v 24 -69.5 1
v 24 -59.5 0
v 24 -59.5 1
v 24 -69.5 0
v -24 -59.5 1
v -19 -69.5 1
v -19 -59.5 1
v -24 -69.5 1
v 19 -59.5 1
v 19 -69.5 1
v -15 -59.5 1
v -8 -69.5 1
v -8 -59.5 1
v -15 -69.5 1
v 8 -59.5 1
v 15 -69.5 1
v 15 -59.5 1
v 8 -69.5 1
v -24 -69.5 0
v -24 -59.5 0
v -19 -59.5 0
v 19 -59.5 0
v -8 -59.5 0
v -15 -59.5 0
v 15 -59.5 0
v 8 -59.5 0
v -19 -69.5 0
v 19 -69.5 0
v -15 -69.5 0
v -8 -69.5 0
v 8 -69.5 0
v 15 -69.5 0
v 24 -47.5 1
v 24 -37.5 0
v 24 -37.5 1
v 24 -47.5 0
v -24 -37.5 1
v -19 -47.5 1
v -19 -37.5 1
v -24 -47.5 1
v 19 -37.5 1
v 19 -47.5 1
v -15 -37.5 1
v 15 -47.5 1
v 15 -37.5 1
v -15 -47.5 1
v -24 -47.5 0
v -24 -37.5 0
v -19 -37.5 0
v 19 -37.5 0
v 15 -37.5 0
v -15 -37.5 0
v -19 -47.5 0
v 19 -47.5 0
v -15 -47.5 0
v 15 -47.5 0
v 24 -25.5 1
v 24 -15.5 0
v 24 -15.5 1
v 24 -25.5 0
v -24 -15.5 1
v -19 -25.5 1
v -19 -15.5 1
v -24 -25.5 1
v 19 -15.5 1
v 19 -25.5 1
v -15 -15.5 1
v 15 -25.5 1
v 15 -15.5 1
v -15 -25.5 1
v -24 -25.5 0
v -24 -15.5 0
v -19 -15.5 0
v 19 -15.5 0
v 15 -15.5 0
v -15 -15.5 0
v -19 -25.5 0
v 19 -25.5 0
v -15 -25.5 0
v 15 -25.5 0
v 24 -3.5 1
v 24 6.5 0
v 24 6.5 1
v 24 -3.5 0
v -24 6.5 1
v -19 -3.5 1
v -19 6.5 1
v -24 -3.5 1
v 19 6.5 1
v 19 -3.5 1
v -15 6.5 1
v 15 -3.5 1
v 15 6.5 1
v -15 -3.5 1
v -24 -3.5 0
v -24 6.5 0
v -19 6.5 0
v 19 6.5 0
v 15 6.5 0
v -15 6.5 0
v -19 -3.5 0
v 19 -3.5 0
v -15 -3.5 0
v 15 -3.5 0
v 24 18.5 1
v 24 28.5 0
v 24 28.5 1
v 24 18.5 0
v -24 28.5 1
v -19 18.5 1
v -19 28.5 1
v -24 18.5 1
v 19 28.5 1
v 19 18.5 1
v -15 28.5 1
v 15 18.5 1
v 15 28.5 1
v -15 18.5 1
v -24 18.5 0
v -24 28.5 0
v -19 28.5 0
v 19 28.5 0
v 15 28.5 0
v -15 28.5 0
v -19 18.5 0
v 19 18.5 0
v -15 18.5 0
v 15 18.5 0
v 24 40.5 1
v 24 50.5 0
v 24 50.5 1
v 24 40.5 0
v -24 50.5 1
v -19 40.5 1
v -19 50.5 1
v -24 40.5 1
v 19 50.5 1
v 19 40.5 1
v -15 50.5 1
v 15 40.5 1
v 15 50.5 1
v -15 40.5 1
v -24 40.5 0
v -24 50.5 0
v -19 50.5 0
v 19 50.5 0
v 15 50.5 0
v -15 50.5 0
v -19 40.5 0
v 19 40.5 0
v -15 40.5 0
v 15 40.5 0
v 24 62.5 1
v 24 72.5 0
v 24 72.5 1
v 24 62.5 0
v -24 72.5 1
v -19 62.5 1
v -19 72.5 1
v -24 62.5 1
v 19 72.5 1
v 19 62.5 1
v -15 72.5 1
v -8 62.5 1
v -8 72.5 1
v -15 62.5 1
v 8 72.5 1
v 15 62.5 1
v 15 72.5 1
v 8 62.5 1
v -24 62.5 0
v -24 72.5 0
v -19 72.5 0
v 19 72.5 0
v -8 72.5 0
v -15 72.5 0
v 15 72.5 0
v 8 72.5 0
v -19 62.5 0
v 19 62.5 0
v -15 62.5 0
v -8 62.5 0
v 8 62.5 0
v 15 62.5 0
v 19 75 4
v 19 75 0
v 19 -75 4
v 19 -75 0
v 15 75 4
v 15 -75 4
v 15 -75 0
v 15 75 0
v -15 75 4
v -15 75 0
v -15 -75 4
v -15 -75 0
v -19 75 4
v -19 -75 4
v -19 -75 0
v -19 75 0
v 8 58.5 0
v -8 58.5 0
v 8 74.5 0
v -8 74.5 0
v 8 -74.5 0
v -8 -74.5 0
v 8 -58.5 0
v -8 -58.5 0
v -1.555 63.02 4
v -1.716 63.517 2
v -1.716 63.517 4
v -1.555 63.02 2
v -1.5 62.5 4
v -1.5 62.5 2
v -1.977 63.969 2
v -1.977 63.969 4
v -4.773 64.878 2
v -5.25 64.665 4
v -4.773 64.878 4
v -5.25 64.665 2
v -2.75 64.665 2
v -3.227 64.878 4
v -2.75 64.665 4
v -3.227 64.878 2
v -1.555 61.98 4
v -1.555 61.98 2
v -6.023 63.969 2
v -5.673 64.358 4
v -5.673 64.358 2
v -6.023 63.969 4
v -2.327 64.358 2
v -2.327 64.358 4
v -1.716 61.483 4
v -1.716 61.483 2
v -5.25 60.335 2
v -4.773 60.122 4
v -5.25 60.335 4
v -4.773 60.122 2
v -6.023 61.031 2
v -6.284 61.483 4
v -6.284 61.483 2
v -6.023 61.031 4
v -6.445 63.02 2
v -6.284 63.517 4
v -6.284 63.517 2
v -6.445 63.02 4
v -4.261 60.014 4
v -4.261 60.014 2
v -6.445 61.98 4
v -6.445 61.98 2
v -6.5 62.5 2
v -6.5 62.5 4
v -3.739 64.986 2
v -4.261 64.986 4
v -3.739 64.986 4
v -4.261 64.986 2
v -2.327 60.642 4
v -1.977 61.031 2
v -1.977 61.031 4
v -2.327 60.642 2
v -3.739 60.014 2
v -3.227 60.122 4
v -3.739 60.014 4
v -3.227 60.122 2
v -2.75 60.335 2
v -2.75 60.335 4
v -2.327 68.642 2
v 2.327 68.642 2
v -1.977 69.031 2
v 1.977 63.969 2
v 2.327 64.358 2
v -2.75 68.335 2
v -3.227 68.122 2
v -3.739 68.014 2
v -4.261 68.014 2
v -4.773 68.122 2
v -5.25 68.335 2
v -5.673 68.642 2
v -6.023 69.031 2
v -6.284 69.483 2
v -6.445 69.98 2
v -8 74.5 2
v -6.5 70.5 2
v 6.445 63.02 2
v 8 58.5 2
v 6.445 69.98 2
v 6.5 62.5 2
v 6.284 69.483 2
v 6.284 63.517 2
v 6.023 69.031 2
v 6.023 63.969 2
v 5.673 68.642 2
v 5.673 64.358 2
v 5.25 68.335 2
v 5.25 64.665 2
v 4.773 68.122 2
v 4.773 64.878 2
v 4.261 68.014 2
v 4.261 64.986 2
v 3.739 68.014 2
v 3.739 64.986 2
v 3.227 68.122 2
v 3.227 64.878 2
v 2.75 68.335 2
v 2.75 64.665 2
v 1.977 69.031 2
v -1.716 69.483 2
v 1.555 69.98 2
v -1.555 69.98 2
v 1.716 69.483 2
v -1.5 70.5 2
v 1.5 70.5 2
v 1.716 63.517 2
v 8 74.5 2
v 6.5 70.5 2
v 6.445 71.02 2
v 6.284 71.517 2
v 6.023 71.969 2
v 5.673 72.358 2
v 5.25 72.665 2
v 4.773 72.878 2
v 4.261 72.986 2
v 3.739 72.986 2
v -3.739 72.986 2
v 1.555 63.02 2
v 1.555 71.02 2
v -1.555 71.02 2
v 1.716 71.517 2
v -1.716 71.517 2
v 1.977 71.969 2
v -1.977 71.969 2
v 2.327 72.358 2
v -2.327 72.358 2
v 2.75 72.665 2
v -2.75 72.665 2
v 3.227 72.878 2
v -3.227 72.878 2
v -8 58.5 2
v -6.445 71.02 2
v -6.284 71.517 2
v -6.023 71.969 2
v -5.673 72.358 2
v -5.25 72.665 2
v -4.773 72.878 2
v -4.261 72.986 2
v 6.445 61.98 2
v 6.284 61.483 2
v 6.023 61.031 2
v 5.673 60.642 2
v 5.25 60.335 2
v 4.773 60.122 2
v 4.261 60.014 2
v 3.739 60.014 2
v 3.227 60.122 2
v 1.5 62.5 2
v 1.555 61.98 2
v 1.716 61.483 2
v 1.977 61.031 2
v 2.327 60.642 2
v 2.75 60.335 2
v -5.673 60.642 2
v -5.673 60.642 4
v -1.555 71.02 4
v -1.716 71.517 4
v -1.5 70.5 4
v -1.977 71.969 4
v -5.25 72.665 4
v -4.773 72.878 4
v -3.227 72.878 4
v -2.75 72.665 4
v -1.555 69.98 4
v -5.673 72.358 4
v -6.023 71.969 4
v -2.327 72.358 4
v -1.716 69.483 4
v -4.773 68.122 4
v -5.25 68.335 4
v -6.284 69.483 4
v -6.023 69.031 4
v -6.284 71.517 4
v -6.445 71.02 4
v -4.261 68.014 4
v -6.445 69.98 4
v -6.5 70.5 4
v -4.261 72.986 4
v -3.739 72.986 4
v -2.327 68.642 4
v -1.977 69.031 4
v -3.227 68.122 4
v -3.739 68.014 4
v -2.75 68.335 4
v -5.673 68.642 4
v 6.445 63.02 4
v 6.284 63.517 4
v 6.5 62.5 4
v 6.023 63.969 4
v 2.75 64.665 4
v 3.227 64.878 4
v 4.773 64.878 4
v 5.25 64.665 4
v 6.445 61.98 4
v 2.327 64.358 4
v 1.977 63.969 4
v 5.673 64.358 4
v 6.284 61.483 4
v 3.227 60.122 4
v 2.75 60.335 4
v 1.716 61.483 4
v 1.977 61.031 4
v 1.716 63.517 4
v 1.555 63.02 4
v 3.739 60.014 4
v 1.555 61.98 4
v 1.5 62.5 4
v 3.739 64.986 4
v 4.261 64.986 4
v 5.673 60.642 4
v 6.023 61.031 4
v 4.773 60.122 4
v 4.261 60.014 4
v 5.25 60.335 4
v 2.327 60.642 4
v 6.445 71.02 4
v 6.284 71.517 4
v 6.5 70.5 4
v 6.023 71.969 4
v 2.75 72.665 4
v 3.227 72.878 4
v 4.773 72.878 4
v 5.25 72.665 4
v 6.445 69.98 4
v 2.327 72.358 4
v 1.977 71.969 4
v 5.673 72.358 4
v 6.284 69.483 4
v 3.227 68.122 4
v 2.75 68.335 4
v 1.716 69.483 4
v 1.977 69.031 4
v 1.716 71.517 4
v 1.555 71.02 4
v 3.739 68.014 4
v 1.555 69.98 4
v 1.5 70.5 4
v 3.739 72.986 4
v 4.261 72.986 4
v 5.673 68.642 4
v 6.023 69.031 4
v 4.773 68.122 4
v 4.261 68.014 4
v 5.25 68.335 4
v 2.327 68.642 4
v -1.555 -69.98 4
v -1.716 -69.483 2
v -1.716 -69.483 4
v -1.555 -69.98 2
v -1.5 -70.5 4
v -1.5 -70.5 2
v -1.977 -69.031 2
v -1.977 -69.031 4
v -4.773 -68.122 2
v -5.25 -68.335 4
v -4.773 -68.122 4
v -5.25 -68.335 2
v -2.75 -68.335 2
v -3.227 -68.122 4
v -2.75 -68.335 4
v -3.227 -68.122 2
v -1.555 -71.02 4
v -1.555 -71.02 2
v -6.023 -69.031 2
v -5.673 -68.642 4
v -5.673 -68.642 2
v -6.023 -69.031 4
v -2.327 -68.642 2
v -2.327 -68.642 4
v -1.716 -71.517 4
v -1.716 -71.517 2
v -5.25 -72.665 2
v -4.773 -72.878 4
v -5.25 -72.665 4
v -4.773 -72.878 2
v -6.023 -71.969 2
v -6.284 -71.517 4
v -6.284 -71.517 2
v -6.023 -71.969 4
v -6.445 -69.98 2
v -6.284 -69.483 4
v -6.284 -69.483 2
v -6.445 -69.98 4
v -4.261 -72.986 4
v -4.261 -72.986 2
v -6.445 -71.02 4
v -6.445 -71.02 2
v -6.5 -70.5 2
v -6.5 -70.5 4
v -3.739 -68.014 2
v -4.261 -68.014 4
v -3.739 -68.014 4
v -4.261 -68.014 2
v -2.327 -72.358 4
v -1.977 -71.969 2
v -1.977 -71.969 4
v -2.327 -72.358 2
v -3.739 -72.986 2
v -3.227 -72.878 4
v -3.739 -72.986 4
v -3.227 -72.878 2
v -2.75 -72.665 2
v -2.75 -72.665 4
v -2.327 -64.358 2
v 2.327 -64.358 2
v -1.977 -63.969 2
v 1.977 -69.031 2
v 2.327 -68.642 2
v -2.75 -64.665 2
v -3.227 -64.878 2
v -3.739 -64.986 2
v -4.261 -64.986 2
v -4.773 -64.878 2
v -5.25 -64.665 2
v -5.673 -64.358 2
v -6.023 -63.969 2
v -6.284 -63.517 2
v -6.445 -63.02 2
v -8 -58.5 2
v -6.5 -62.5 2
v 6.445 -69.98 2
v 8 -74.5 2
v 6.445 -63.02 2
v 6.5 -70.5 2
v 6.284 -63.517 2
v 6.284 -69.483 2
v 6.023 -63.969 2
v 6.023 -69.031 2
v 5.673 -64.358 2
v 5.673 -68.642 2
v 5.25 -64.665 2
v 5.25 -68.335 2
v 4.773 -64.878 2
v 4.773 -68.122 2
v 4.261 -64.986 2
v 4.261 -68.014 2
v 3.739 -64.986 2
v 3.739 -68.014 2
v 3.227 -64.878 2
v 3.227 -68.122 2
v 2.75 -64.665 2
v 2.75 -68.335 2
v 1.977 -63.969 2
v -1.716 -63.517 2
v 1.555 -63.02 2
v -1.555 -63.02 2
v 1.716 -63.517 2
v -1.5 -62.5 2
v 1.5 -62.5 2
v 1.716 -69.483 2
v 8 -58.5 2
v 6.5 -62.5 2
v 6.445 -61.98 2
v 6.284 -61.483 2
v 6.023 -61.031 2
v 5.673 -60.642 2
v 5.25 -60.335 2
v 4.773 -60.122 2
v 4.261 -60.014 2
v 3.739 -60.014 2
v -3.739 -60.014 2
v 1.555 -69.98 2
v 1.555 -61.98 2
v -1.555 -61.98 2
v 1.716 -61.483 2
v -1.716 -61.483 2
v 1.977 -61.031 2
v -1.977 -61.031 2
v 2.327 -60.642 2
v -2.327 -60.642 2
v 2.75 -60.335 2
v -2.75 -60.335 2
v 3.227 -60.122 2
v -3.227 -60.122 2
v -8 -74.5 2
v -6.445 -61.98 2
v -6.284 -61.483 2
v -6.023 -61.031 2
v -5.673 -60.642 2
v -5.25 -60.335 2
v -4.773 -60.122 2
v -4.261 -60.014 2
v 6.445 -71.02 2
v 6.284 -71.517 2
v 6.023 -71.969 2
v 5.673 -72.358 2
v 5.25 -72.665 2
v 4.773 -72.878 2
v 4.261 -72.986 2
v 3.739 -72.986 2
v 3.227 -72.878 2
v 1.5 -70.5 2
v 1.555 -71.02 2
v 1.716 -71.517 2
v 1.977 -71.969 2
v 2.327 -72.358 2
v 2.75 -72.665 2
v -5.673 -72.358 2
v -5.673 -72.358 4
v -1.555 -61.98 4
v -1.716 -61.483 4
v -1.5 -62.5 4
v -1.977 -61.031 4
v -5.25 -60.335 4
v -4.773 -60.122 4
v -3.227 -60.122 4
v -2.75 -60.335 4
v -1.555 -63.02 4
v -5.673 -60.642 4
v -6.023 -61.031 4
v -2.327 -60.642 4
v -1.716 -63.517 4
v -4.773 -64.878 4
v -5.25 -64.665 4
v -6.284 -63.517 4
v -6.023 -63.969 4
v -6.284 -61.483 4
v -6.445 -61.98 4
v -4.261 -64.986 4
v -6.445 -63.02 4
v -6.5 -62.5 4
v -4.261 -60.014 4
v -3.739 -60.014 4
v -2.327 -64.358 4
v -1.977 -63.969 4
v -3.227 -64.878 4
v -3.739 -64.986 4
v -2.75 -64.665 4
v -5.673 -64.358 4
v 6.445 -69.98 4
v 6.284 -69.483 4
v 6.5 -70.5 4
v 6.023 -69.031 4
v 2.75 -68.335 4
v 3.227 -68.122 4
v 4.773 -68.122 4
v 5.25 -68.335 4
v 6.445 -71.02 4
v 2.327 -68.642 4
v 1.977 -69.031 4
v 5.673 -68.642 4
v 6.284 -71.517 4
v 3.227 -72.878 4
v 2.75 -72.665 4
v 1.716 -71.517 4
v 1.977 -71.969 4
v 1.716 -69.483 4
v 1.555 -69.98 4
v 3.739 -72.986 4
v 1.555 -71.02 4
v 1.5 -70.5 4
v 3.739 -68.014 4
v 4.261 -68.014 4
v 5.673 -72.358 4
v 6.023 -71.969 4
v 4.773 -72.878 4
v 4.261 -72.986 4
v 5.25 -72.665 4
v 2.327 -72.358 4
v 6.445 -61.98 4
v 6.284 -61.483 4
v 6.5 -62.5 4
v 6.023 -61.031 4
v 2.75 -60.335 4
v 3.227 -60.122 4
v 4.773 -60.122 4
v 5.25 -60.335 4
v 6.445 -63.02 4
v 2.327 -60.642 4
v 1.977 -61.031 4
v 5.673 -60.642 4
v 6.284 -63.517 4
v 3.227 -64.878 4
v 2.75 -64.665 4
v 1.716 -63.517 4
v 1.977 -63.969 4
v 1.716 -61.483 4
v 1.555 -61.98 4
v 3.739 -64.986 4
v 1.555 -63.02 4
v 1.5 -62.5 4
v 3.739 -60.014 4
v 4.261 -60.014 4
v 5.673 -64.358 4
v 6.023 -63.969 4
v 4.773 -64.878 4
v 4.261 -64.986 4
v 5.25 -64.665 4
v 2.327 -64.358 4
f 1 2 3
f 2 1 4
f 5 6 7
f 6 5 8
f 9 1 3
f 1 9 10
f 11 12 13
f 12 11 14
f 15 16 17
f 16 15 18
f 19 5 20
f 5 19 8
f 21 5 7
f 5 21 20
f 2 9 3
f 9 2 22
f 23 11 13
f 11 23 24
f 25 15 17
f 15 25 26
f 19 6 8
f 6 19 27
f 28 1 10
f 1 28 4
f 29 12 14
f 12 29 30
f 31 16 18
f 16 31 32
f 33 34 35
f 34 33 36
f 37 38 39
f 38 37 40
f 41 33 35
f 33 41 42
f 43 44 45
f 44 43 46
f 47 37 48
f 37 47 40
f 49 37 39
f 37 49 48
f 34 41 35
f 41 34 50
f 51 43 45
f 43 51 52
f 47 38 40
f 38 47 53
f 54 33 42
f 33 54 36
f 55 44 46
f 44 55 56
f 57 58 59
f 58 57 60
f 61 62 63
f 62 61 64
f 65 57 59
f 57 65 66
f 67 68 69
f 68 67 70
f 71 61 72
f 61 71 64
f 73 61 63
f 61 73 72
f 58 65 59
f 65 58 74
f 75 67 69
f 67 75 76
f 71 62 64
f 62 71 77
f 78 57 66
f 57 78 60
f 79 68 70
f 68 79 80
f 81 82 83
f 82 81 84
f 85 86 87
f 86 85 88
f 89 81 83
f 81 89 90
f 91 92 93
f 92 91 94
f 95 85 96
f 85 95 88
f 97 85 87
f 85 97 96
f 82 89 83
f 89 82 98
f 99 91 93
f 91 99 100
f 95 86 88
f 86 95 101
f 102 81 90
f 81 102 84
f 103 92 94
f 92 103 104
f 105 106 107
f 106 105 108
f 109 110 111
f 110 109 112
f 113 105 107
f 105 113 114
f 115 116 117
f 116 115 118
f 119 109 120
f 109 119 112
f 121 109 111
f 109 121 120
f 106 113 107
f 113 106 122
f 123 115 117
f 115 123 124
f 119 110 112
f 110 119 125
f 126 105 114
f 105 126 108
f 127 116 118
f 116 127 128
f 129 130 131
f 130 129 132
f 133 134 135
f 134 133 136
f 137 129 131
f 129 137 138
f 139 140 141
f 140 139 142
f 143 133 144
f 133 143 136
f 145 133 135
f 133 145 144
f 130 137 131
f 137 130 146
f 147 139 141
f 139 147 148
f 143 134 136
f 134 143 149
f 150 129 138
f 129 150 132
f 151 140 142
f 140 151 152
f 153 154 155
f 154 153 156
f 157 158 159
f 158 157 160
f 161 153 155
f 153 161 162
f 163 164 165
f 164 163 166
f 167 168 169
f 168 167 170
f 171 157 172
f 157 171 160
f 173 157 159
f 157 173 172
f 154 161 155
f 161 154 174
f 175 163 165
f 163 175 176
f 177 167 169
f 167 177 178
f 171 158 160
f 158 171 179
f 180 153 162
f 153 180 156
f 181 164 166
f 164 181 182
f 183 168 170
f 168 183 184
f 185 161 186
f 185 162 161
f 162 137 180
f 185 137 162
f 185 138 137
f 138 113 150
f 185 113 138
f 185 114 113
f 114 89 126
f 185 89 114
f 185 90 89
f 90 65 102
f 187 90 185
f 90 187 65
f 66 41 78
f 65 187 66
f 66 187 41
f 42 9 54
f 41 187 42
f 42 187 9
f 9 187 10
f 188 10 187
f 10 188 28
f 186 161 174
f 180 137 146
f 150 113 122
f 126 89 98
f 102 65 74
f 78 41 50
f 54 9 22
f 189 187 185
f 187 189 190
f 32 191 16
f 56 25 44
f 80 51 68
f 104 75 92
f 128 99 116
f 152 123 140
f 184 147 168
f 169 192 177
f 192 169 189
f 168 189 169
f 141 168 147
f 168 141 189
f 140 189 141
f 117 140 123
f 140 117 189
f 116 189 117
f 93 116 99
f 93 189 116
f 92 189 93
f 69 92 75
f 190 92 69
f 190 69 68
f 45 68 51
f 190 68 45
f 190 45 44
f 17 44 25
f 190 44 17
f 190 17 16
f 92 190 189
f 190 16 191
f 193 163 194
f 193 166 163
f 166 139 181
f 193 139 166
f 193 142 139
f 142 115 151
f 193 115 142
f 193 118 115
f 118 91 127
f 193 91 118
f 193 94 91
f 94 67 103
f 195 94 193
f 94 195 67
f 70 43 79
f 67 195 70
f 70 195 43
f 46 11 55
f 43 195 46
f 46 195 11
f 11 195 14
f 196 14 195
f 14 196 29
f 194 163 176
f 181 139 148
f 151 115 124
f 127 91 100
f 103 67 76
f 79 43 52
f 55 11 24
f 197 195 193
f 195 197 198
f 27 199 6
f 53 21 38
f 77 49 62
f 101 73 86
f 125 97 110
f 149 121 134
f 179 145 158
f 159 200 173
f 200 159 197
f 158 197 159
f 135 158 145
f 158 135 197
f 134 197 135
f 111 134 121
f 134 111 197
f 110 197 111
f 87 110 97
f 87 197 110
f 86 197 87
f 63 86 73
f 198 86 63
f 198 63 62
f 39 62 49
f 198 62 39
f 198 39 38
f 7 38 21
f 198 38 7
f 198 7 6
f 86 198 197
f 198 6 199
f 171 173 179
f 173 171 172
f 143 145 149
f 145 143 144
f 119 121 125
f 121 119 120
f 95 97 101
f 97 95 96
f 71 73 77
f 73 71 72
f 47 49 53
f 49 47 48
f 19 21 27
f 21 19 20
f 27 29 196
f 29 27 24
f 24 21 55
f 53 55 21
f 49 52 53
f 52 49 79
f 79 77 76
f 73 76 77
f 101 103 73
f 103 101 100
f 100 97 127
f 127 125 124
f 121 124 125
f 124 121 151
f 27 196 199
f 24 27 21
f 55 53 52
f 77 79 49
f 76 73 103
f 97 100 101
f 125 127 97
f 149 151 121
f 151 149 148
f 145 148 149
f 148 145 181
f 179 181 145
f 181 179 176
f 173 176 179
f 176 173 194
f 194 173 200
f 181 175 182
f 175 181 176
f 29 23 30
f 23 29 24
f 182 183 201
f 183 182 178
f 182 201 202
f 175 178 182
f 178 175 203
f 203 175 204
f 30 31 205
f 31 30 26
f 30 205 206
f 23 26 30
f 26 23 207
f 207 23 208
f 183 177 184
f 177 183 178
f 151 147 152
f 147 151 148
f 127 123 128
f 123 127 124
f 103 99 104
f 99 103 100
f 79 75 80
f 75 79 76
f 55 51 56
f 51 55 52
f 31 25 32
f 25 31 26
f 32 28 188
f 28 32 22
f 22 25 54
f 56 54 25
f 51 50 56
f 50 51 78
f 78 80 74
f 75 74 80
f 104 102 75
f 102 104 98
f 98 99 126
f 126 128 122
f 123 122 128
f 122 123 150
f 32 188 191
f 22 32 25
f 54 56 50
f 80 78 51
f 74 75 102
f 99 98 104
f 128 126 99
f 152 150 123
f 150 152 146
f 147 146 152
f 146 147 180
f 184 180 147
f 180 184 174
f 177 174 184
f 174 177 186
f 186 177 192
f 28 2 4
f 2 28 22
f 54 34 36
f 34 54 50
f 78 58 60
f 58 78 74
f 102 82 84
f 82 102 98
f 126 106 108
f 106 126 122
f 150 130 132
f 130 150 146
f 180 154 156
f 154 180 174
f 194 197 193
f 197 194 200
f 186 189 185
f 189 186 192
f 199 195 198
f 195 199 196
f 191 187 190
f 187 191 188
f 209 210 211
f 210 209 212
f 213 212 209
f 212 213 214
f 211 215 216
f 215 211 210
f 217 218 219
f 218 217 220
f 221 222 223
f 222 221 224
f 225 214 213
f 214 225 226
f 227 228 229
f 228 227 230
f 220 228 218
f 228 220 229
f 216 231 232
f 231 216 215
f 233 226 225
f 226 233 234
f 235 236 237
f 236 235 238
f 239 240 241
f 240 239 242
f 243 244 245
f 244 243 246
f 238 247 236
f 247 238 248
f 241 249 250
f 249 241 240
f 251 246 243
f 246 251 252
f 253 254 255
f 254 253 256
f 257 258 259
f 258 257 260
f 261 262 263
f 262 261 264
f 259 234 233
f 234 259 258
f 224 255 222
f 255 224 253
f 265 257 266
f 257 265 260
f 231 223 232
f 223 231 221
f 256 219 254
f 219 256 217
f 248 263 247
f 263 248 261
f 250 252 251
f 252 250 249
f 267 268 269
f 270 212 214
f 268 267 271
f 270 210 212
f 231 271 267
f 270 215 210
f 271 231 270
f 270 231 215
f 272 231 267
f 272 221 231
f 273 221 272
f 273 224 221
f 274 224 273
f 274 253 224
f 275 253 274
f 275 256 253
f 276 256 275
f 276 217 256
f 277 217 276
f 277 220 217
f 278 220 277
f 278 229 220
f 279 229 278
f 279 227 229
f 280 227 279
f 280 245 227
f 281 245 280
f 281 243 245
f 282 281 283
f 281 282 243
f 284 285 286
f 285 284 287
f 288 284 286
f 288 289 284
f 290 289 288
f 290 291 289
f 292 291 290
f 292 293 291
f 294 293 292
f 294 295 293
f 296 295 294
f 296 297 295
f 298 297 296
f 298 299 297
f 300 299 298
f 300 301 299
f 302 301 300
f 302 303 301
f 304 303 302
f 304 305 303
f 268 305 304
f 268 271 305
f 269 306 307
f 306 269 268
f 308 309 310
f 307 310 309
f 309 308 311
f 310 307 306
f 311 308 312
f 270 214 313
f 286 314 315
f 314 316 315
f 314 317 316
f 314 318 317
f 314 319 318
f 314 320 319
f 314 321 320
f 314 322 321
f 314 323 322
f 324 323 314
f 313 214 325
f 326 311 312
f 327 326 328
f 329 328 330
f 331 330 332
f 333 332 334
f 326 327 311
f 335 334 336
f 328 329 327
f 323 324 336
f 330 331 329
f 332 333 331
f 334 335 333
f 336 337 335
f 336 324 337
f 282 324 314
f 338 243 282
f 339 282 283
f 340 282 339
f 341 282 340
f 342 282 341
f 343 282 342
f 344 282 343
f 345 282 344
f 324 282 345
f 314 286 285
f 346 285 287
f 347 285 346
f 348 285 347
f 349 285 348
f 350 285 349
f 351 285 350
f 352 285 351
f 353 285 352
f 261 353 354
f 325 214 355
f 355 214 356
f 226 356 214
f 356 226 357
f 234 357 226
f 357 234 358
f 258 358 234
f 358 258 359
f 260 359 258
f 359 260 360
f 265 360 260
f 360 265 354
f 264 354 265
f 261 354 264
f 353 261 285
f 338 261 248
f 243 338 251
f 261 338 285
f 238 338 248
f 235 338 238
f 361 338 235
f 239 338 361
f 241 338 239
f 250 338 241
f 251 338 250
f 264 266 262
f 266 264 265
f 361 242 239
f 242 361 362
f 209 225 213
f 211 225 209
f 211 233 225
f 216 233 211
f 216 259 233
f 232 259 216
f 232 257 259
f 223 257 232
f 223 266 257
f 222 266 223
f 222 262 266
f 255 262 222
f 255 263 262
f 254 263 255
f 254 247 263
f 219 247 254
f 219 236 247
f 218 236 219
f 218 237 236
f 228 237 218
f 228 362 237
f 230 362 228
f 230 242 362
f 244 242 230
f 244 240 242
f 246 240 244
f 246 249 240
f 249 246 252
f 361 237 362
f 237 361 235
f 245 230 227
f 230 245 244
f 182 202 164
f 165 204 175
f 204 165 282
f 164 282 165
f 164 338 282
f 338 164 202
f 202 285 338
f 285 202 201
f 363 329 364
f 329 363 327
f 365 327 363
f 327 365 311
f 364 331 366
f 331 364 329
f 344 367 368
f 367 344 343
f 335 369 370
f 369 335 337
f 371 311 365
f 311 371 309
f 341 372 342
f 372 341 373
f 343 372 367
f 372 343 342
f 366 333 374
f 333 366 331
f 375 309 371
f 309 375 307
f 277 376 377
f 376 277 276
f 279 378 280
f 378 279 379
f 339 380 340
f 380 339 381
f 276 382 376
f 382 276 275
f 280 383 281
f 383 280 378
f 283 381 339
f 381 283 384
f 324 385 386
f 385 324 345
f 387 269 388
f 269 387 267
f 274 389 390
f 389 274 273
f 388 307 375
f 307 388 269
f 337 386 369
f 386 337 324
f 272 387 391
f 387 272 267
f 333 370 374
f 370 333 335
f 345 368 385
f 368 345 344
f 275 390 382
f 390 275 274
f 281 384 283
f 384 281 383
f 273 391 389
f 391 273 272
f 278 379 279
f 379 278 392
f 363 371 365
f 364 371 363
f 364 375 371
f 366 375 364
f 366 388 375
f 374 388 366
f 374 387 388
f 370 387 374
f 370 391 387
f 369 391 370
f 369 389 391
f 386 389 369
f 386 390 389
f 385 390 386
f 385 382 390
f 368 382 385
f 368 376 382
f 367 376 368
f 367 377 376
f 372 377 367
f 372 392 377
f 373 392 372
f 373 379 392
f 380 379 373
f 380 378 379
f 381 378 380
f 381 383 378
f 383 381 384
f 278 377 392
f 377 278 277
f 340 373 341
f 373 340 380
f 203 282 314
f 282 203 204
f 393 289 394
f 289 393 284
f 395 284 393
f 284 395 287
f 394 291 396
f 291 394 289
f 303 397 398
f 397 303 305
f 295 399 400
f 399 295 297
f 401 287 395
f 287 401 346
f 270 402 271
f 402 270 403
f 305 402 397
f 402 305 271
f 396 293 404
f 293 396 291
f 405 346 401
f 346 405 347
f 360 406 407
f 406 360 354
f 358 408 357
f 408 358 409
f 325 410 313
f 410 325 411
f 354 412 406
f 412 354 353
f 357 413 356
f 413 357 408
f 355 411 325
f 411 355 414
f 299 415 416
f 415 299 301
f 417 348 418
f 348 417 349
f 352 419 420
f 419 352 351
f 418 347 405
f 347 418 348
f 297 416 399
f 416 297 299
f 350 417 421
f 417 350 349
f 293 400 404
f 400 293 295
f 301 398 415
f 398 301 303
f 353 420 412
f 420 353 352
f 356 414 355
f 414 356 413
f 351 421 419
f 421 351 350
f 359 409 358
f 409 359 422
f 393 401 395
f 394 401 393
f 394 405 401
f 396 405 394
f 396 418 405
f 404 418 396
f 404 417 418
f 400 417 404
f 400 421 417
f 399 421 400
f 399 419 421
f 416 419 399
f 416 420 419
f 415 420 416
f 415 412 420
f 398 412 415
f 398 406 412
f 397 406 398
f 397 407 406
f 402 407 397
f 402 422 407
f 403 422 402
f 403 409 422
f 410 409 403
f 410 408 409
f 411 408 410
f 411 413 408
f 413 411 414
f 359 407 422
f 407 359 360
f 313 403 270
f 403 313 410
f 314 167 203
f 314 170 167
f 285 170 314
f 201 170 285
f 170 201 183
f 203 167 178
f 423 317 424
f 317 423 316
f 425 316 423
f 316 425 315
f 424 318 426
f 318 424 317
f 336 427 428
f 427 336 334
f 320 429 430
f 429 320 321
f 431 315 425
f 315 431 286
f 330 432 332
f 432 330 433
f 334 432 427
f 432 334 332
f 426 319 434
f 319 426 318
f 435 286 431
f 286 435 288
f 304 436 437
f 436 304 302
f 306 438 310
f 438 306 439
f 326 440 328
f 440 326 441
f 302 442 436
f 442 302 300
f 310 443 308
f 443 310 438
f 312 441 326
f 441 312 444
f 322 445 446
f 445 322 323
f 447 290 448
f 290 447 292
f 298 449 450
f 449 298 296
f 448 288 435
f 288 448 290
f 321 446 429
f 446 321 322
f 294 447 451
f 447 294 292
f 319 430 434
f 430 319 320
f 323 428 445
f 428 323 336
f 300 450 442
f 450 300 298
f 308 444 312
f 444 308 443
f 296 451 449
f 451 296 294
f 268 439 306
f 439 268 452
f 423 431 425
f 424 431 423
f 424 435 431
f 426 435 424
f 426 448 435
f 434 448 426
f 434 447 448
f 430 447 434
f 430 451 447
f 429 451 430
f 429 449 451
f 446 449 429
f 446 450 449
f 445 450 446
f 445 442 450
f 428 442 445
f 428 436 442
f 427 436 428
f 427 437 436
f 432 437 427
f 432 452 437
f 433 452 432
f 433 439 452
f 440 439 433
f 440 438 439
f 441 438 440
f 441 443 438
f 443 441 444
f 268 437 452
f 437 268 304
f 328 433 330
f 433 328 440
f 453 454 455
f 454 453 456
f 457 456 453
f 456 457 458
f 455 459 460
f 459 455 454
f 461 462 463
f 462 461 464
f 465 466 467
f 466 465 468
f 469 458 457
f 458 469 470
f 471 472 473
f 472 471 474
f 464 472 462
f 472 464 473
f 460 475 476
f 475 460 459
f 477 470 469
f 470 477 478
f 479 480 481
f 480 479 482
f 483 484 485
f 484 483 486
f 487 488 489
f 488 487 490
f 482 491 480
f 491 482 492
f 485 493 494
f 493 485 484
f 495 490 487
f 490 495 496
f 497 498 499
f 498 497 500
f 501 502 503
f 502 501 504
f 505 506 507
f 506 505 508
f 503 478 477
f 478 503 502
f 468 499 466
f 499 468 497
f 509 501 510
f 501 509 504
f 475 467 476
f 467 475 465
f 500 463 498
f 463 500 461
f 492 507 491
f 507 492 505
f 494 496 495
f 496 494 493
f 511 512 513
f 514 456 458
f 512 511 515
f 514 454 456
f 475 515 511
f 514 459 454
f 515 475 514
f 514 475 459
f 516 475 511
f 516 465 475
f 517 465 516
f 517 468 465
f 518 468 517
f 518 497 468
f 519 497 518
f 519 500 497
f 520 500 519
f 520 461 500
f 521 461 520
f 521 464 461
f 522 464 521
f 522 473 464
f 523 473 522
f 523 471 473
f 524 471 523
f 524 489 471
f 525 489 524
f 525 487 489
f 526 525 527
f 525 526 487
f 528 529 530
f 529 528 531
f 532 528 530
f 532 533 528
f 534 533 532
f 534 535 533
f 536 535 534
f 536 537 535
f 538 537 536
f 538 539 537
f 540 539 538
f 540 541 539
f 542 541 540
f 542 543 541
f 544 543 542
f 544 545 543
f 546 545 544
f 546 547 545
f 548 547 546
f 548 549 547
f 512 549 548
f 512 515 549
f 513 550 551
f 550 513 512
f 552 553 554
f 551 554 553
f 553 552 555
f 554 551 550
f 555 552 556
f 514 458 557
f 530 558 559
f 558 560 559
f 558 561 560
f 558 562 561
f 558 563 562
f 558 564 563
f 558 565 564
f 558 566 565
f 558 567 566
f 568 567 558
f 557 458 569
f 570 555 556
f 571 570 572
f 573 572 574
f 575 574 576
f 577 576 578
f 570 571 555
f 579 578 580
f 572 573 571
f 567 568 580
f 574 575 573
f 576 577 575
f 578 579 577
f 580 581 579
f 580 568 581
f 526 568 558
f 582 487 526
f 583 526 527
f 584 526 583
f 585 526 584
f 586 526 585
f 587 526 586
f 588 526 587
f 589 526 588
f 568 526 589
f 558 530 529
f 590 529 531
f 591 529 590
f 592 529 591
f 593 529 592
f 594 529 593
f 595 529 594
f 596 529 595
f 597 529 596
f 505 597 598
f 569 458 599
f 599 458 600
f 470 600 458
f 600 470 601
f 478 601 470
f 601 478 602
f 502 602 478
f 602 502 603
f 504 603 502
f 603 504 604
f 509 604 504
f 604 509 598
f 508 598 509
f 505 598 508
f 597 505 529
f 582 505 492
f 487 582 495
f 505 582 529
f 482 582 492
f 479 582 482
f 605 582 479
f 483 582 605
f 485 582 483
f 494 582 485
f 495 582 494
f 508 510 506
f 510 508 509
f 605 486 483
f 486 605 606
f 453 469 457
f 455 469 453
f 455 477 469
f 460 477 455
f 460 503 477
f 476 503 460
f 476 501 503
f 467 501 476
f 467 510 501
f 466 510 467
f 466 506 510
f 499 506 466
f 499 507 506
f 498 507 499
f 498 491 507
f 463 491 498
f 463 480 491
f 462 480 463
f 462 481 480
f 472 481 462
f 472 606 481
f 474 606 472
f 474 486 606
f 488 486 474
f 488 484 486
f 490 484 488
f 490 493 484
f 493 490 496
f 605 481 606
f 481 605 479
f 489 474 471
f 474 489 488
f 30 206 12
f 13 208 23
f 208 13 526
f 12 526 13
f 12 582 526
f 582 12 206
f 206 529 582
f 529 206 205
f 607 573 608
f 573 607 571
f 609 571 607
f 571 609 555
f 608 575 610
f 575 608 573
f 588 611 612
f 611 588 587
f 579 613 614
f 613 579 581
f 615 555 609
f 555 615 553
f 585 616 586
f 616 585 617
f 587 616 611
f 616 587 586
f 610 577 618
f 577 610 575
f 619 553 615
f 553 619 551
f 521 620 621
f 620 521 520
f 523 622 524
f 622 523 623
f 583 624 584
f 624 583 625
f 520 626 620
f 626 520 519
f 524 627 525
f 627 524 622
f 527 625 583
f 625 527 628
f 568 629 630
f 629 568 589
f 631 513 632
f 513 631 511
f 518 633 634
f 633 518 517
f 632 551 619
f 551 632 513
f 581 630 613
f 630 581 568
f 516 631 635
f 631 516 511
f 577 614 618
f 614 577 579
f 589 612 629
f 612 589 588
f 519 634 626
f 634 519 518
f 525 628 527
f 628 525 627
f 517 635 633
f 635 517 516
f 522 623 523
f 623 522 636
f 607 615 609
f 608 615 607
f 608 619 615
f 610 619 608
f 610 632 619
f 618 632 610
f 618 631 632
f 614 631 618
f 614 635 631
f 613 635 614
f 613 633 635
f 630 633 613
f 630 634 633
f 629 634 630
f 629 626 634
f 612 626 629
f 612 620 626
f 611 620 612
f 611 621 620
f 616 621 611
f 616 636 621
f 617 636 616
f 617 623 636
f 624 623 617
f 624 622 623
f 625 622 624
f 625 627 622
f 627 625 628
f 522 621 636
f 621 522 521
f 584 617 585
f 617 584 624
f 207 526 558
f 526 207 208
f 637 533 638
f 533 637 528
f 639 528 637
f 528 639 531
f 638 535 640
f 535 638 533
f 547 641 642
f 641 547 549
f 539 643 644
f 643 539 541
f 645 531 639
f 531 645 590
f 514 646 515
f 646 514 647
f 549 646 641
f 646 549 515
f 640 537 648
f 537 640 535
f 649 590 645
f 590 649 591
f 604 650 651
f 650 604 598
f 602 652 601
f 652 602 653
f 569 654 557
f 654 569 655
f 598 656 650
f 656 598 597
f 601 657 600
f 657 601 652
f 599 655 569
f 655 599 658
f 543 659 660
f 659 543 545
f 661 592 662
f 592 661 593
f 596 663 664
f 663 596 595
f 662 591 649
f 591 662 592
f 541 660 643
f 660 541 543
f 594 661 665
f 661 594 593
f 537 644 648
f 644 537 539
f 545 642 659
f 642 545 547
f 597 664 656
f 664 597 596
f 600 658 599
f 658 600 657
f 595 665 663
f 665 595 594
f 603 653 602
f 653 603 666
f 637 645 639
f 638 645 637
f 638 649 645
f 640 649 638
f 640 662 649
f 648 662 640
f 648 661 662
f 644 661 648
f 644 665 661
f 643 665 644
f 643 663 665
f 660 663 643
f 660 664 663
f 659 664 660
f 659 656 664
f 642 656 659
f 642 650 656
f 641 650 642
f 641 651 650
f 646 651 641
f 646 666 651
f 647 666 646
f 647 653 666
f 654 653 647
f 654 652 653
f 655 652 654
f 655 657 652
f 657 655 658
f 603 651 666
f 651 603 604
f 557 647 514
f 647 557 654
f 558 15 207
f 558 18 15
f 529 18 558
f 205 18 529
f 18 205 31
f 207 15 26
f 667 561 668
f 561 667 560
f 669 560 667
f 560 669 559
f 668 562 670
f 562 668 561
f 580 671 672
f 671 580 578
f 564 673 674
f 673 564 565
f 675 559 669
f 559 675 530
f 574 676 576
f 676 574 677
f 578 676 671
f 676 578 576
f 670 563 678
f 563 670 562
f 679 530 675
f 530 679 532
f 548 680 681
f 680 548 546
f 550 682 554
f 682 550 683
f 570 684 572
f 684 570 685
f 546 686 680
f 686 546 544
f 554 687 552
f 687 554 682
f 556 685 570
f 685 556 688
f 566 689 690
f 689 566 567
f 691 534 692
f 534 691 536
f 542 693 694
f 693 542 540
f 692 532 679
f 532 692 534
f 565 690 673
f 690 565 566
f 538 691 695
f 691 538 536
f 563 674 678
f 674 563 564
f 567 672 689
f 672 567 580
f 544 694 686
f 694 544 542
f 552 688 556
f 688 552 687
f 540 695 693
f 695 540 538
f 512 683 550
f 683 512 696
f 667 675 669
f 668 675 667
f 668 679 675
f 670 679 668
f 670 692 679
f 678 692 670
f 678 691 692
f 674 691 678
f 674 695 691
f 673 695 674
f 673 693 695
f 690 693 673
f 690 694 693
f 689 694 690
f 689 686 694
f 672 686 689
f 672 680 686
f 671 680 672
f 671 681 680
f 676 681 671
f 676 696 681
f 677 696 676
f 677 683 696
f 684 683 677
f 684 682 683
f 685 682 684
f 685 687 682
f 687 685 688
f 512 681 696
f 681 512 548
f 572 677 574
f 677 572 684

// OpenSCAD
//
// Long track, made to be compatible with Geotrax®
// (with a lego join system)
// Author: Francois Crevola (francois@crevola.org)
//

epsilon = 0.0001;

// Try d = 0 for more Geotraxed version
// Try d = -7 for simplified version (more 3D-printer friendly)
// Try d = -9.0001 for extremely simplfied version (more cost friendly)

d = -7;
d = -(9+epsilon);

intersection() {
  translate([0,0,d]) longTrack();
  translate([0,0,10]) cube(size=[150,150,20], center=true);
}


translate([0,153/2-10,0]) elgoPlate();
translate([0,-153/2+10,0]) elgoPlate();

module elgoPlate() {
   for(i=[-1,1]) {
		for(j=[-1,1]) {
			translate([i*4,j*4,0]) elgoPlot();
		}
	}
}

module elgoPlot() {
	translate([0,0,2]) cylinder(h = 2, r=2.5, $fs=0.5);
	translate([0,0,1]) cube(size=[8,8,2], center=true);
}

module longTrack() {

long = 153;

// main piece
	rotate([90,0,0])
	translate([0, 0, -long/2]) // center
	linear_extrude(height=long)
		polygon(points=[[0,7],[-25,7],[-30,0],[-32,0],[-25,9],[-19,9],[-19,13],[-15,13],[-15,9],[15,9],[15,13],[19,13],[19,9],[25,9],[32,0],[30,0],[25,7]], paths=[[0,1,2,3,4,5,6,7,8,9,10,11,12,13,14,15,16,17,18,19,20]]);


// + traverses
spacing = 22;
max = 7;
delta = 10;
for (i = [1:max]) // n iterations
{
	translate([0,-long/2+(i*spacing)-delta,9.5])
	cube(size = [48, 10, 1], center = true);
}

// + supports
for (i = [-1, 0, 1]) {
	translate([0,i*(long/3),0])
	rotate([90,0,0])
	linear_extrude(height=2.5)
		polygon(points=[[-32,0],[-25,9],[25,9],[32,0]], paths=[[0,1,2,3,4,5,6,7,8,9,10,11,12,13,14,15,16,17,18,19,20]]);
}

}
